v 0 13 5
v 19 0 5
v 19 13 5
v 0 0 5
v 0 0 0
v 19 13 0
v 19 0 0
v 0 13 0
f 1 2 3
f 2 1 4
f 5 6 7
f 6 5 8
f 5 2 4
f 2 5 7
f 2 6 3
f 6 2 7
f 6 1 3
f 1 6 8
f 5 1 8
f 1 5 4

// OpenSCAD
// Generated by SolidPython 1.0.1 on 2020-07-29 00:46:56


cube(size = [19, 13, 5]);
/***********************************************
*********      SolidPython code:      **********
************************************************
 
# import packages: SolidPython
from solid import *
from solid.utils import *
from itertools import chain, combinations, permutations


class Resize:

    def __init__(self, scad_file):
        self.scad_file = scad_file
        #self.scad_file = import_scad(scad_file)
        # cone/cylinder param:
        self.r1 = 0
        self.r2 = 0
        self.h = 0
        # rectangular prism param:
        self.w = 0
        self.l = 0
        # ellipse param:
        self.r = 0

    # import OpenScad code (file name corresponds to shape)


    # classify shape + parameters
    def assign(self, param1, param2, param3):
        if self.scad_file == 'cone.scad':
            self.r1 = param1
            self.r2 = param2
            self.h = param3
        elif self.scad_file == 'cylinder.scad':
            self.r1 = param1
            self.r2 = param2
            self.h = param3
        elif self.scad_file == 'rectangularPrism.scad':
            self.h = param1
            self.l = param2
            self.w = param3
        else:
            self.r = param1
            self.h = param2

    # resize parameters
    def iterate(self):
        x = range(3, 20, 2)
        i = 1
        if self.scad_file == 'cone.scad':
            tempList = list(permutations(x, 2))
            for temp in tempList:
                param1 = temp[0]
                param2 = temp[1]
                filepath = 'produced_scad_files/' + 'cone' + str(param1) + '_' + str(param2) + '_' + '.scad'
                scad_render_to_file(cylinder(h=param1, r1=param2, r2=0), filepath)

        elif self.scad_file == 'cylinder.scad':
            tempList = list(permutations(x, 3))
            for temp in tempList:
                param1 = temp[0]
                param2 = temp[1]
                filepath = 'produced_scad_files/' + 'cylinder' + str(param1) + '_' + str(param2) + '_' + '.scad'
                scad_render_to_file(cylinder(h=param1, r1=param2, r2=param2), filepath)

        elif self.scad_file == 'rectangularPrism.scad':
            tempList = list(permutations(x, 3))
            for temp in tempList:
                param1 = temp[0]
                param2 = temp[1]
                param3 = temp[2]
                filepath = 'produced_scad_files/' + 'rectangularPrism' + str(param1) + '_' + str(param2) + '_' + str(
                    param3) + '.scad'
                scad_render_to_file(cube(size=(param1, param2, param3)), filepath)

        elif self.scad_file == 'ellipse.scad':
            tempList = list(permutations(x, 4))
            for temp in tempList:
                param1 = temp[0]
                param2 = temp[1]
                param3 = temp[2]
                param4 = temp[3]
                filepath = 'produced_scad_files/' + 'ellipse' + str(param1) + '_' + str(param2) + '_' + str(param3) + '_' + str(param4) + '.scad'
                scad_render_to_file(scale([param1, param2, param3])(sphere(r=param4)), filepath)

    def render_to_scadfile(self):
        scad_render_to_file(scad, 'example.scad') 
 
************************************************/
